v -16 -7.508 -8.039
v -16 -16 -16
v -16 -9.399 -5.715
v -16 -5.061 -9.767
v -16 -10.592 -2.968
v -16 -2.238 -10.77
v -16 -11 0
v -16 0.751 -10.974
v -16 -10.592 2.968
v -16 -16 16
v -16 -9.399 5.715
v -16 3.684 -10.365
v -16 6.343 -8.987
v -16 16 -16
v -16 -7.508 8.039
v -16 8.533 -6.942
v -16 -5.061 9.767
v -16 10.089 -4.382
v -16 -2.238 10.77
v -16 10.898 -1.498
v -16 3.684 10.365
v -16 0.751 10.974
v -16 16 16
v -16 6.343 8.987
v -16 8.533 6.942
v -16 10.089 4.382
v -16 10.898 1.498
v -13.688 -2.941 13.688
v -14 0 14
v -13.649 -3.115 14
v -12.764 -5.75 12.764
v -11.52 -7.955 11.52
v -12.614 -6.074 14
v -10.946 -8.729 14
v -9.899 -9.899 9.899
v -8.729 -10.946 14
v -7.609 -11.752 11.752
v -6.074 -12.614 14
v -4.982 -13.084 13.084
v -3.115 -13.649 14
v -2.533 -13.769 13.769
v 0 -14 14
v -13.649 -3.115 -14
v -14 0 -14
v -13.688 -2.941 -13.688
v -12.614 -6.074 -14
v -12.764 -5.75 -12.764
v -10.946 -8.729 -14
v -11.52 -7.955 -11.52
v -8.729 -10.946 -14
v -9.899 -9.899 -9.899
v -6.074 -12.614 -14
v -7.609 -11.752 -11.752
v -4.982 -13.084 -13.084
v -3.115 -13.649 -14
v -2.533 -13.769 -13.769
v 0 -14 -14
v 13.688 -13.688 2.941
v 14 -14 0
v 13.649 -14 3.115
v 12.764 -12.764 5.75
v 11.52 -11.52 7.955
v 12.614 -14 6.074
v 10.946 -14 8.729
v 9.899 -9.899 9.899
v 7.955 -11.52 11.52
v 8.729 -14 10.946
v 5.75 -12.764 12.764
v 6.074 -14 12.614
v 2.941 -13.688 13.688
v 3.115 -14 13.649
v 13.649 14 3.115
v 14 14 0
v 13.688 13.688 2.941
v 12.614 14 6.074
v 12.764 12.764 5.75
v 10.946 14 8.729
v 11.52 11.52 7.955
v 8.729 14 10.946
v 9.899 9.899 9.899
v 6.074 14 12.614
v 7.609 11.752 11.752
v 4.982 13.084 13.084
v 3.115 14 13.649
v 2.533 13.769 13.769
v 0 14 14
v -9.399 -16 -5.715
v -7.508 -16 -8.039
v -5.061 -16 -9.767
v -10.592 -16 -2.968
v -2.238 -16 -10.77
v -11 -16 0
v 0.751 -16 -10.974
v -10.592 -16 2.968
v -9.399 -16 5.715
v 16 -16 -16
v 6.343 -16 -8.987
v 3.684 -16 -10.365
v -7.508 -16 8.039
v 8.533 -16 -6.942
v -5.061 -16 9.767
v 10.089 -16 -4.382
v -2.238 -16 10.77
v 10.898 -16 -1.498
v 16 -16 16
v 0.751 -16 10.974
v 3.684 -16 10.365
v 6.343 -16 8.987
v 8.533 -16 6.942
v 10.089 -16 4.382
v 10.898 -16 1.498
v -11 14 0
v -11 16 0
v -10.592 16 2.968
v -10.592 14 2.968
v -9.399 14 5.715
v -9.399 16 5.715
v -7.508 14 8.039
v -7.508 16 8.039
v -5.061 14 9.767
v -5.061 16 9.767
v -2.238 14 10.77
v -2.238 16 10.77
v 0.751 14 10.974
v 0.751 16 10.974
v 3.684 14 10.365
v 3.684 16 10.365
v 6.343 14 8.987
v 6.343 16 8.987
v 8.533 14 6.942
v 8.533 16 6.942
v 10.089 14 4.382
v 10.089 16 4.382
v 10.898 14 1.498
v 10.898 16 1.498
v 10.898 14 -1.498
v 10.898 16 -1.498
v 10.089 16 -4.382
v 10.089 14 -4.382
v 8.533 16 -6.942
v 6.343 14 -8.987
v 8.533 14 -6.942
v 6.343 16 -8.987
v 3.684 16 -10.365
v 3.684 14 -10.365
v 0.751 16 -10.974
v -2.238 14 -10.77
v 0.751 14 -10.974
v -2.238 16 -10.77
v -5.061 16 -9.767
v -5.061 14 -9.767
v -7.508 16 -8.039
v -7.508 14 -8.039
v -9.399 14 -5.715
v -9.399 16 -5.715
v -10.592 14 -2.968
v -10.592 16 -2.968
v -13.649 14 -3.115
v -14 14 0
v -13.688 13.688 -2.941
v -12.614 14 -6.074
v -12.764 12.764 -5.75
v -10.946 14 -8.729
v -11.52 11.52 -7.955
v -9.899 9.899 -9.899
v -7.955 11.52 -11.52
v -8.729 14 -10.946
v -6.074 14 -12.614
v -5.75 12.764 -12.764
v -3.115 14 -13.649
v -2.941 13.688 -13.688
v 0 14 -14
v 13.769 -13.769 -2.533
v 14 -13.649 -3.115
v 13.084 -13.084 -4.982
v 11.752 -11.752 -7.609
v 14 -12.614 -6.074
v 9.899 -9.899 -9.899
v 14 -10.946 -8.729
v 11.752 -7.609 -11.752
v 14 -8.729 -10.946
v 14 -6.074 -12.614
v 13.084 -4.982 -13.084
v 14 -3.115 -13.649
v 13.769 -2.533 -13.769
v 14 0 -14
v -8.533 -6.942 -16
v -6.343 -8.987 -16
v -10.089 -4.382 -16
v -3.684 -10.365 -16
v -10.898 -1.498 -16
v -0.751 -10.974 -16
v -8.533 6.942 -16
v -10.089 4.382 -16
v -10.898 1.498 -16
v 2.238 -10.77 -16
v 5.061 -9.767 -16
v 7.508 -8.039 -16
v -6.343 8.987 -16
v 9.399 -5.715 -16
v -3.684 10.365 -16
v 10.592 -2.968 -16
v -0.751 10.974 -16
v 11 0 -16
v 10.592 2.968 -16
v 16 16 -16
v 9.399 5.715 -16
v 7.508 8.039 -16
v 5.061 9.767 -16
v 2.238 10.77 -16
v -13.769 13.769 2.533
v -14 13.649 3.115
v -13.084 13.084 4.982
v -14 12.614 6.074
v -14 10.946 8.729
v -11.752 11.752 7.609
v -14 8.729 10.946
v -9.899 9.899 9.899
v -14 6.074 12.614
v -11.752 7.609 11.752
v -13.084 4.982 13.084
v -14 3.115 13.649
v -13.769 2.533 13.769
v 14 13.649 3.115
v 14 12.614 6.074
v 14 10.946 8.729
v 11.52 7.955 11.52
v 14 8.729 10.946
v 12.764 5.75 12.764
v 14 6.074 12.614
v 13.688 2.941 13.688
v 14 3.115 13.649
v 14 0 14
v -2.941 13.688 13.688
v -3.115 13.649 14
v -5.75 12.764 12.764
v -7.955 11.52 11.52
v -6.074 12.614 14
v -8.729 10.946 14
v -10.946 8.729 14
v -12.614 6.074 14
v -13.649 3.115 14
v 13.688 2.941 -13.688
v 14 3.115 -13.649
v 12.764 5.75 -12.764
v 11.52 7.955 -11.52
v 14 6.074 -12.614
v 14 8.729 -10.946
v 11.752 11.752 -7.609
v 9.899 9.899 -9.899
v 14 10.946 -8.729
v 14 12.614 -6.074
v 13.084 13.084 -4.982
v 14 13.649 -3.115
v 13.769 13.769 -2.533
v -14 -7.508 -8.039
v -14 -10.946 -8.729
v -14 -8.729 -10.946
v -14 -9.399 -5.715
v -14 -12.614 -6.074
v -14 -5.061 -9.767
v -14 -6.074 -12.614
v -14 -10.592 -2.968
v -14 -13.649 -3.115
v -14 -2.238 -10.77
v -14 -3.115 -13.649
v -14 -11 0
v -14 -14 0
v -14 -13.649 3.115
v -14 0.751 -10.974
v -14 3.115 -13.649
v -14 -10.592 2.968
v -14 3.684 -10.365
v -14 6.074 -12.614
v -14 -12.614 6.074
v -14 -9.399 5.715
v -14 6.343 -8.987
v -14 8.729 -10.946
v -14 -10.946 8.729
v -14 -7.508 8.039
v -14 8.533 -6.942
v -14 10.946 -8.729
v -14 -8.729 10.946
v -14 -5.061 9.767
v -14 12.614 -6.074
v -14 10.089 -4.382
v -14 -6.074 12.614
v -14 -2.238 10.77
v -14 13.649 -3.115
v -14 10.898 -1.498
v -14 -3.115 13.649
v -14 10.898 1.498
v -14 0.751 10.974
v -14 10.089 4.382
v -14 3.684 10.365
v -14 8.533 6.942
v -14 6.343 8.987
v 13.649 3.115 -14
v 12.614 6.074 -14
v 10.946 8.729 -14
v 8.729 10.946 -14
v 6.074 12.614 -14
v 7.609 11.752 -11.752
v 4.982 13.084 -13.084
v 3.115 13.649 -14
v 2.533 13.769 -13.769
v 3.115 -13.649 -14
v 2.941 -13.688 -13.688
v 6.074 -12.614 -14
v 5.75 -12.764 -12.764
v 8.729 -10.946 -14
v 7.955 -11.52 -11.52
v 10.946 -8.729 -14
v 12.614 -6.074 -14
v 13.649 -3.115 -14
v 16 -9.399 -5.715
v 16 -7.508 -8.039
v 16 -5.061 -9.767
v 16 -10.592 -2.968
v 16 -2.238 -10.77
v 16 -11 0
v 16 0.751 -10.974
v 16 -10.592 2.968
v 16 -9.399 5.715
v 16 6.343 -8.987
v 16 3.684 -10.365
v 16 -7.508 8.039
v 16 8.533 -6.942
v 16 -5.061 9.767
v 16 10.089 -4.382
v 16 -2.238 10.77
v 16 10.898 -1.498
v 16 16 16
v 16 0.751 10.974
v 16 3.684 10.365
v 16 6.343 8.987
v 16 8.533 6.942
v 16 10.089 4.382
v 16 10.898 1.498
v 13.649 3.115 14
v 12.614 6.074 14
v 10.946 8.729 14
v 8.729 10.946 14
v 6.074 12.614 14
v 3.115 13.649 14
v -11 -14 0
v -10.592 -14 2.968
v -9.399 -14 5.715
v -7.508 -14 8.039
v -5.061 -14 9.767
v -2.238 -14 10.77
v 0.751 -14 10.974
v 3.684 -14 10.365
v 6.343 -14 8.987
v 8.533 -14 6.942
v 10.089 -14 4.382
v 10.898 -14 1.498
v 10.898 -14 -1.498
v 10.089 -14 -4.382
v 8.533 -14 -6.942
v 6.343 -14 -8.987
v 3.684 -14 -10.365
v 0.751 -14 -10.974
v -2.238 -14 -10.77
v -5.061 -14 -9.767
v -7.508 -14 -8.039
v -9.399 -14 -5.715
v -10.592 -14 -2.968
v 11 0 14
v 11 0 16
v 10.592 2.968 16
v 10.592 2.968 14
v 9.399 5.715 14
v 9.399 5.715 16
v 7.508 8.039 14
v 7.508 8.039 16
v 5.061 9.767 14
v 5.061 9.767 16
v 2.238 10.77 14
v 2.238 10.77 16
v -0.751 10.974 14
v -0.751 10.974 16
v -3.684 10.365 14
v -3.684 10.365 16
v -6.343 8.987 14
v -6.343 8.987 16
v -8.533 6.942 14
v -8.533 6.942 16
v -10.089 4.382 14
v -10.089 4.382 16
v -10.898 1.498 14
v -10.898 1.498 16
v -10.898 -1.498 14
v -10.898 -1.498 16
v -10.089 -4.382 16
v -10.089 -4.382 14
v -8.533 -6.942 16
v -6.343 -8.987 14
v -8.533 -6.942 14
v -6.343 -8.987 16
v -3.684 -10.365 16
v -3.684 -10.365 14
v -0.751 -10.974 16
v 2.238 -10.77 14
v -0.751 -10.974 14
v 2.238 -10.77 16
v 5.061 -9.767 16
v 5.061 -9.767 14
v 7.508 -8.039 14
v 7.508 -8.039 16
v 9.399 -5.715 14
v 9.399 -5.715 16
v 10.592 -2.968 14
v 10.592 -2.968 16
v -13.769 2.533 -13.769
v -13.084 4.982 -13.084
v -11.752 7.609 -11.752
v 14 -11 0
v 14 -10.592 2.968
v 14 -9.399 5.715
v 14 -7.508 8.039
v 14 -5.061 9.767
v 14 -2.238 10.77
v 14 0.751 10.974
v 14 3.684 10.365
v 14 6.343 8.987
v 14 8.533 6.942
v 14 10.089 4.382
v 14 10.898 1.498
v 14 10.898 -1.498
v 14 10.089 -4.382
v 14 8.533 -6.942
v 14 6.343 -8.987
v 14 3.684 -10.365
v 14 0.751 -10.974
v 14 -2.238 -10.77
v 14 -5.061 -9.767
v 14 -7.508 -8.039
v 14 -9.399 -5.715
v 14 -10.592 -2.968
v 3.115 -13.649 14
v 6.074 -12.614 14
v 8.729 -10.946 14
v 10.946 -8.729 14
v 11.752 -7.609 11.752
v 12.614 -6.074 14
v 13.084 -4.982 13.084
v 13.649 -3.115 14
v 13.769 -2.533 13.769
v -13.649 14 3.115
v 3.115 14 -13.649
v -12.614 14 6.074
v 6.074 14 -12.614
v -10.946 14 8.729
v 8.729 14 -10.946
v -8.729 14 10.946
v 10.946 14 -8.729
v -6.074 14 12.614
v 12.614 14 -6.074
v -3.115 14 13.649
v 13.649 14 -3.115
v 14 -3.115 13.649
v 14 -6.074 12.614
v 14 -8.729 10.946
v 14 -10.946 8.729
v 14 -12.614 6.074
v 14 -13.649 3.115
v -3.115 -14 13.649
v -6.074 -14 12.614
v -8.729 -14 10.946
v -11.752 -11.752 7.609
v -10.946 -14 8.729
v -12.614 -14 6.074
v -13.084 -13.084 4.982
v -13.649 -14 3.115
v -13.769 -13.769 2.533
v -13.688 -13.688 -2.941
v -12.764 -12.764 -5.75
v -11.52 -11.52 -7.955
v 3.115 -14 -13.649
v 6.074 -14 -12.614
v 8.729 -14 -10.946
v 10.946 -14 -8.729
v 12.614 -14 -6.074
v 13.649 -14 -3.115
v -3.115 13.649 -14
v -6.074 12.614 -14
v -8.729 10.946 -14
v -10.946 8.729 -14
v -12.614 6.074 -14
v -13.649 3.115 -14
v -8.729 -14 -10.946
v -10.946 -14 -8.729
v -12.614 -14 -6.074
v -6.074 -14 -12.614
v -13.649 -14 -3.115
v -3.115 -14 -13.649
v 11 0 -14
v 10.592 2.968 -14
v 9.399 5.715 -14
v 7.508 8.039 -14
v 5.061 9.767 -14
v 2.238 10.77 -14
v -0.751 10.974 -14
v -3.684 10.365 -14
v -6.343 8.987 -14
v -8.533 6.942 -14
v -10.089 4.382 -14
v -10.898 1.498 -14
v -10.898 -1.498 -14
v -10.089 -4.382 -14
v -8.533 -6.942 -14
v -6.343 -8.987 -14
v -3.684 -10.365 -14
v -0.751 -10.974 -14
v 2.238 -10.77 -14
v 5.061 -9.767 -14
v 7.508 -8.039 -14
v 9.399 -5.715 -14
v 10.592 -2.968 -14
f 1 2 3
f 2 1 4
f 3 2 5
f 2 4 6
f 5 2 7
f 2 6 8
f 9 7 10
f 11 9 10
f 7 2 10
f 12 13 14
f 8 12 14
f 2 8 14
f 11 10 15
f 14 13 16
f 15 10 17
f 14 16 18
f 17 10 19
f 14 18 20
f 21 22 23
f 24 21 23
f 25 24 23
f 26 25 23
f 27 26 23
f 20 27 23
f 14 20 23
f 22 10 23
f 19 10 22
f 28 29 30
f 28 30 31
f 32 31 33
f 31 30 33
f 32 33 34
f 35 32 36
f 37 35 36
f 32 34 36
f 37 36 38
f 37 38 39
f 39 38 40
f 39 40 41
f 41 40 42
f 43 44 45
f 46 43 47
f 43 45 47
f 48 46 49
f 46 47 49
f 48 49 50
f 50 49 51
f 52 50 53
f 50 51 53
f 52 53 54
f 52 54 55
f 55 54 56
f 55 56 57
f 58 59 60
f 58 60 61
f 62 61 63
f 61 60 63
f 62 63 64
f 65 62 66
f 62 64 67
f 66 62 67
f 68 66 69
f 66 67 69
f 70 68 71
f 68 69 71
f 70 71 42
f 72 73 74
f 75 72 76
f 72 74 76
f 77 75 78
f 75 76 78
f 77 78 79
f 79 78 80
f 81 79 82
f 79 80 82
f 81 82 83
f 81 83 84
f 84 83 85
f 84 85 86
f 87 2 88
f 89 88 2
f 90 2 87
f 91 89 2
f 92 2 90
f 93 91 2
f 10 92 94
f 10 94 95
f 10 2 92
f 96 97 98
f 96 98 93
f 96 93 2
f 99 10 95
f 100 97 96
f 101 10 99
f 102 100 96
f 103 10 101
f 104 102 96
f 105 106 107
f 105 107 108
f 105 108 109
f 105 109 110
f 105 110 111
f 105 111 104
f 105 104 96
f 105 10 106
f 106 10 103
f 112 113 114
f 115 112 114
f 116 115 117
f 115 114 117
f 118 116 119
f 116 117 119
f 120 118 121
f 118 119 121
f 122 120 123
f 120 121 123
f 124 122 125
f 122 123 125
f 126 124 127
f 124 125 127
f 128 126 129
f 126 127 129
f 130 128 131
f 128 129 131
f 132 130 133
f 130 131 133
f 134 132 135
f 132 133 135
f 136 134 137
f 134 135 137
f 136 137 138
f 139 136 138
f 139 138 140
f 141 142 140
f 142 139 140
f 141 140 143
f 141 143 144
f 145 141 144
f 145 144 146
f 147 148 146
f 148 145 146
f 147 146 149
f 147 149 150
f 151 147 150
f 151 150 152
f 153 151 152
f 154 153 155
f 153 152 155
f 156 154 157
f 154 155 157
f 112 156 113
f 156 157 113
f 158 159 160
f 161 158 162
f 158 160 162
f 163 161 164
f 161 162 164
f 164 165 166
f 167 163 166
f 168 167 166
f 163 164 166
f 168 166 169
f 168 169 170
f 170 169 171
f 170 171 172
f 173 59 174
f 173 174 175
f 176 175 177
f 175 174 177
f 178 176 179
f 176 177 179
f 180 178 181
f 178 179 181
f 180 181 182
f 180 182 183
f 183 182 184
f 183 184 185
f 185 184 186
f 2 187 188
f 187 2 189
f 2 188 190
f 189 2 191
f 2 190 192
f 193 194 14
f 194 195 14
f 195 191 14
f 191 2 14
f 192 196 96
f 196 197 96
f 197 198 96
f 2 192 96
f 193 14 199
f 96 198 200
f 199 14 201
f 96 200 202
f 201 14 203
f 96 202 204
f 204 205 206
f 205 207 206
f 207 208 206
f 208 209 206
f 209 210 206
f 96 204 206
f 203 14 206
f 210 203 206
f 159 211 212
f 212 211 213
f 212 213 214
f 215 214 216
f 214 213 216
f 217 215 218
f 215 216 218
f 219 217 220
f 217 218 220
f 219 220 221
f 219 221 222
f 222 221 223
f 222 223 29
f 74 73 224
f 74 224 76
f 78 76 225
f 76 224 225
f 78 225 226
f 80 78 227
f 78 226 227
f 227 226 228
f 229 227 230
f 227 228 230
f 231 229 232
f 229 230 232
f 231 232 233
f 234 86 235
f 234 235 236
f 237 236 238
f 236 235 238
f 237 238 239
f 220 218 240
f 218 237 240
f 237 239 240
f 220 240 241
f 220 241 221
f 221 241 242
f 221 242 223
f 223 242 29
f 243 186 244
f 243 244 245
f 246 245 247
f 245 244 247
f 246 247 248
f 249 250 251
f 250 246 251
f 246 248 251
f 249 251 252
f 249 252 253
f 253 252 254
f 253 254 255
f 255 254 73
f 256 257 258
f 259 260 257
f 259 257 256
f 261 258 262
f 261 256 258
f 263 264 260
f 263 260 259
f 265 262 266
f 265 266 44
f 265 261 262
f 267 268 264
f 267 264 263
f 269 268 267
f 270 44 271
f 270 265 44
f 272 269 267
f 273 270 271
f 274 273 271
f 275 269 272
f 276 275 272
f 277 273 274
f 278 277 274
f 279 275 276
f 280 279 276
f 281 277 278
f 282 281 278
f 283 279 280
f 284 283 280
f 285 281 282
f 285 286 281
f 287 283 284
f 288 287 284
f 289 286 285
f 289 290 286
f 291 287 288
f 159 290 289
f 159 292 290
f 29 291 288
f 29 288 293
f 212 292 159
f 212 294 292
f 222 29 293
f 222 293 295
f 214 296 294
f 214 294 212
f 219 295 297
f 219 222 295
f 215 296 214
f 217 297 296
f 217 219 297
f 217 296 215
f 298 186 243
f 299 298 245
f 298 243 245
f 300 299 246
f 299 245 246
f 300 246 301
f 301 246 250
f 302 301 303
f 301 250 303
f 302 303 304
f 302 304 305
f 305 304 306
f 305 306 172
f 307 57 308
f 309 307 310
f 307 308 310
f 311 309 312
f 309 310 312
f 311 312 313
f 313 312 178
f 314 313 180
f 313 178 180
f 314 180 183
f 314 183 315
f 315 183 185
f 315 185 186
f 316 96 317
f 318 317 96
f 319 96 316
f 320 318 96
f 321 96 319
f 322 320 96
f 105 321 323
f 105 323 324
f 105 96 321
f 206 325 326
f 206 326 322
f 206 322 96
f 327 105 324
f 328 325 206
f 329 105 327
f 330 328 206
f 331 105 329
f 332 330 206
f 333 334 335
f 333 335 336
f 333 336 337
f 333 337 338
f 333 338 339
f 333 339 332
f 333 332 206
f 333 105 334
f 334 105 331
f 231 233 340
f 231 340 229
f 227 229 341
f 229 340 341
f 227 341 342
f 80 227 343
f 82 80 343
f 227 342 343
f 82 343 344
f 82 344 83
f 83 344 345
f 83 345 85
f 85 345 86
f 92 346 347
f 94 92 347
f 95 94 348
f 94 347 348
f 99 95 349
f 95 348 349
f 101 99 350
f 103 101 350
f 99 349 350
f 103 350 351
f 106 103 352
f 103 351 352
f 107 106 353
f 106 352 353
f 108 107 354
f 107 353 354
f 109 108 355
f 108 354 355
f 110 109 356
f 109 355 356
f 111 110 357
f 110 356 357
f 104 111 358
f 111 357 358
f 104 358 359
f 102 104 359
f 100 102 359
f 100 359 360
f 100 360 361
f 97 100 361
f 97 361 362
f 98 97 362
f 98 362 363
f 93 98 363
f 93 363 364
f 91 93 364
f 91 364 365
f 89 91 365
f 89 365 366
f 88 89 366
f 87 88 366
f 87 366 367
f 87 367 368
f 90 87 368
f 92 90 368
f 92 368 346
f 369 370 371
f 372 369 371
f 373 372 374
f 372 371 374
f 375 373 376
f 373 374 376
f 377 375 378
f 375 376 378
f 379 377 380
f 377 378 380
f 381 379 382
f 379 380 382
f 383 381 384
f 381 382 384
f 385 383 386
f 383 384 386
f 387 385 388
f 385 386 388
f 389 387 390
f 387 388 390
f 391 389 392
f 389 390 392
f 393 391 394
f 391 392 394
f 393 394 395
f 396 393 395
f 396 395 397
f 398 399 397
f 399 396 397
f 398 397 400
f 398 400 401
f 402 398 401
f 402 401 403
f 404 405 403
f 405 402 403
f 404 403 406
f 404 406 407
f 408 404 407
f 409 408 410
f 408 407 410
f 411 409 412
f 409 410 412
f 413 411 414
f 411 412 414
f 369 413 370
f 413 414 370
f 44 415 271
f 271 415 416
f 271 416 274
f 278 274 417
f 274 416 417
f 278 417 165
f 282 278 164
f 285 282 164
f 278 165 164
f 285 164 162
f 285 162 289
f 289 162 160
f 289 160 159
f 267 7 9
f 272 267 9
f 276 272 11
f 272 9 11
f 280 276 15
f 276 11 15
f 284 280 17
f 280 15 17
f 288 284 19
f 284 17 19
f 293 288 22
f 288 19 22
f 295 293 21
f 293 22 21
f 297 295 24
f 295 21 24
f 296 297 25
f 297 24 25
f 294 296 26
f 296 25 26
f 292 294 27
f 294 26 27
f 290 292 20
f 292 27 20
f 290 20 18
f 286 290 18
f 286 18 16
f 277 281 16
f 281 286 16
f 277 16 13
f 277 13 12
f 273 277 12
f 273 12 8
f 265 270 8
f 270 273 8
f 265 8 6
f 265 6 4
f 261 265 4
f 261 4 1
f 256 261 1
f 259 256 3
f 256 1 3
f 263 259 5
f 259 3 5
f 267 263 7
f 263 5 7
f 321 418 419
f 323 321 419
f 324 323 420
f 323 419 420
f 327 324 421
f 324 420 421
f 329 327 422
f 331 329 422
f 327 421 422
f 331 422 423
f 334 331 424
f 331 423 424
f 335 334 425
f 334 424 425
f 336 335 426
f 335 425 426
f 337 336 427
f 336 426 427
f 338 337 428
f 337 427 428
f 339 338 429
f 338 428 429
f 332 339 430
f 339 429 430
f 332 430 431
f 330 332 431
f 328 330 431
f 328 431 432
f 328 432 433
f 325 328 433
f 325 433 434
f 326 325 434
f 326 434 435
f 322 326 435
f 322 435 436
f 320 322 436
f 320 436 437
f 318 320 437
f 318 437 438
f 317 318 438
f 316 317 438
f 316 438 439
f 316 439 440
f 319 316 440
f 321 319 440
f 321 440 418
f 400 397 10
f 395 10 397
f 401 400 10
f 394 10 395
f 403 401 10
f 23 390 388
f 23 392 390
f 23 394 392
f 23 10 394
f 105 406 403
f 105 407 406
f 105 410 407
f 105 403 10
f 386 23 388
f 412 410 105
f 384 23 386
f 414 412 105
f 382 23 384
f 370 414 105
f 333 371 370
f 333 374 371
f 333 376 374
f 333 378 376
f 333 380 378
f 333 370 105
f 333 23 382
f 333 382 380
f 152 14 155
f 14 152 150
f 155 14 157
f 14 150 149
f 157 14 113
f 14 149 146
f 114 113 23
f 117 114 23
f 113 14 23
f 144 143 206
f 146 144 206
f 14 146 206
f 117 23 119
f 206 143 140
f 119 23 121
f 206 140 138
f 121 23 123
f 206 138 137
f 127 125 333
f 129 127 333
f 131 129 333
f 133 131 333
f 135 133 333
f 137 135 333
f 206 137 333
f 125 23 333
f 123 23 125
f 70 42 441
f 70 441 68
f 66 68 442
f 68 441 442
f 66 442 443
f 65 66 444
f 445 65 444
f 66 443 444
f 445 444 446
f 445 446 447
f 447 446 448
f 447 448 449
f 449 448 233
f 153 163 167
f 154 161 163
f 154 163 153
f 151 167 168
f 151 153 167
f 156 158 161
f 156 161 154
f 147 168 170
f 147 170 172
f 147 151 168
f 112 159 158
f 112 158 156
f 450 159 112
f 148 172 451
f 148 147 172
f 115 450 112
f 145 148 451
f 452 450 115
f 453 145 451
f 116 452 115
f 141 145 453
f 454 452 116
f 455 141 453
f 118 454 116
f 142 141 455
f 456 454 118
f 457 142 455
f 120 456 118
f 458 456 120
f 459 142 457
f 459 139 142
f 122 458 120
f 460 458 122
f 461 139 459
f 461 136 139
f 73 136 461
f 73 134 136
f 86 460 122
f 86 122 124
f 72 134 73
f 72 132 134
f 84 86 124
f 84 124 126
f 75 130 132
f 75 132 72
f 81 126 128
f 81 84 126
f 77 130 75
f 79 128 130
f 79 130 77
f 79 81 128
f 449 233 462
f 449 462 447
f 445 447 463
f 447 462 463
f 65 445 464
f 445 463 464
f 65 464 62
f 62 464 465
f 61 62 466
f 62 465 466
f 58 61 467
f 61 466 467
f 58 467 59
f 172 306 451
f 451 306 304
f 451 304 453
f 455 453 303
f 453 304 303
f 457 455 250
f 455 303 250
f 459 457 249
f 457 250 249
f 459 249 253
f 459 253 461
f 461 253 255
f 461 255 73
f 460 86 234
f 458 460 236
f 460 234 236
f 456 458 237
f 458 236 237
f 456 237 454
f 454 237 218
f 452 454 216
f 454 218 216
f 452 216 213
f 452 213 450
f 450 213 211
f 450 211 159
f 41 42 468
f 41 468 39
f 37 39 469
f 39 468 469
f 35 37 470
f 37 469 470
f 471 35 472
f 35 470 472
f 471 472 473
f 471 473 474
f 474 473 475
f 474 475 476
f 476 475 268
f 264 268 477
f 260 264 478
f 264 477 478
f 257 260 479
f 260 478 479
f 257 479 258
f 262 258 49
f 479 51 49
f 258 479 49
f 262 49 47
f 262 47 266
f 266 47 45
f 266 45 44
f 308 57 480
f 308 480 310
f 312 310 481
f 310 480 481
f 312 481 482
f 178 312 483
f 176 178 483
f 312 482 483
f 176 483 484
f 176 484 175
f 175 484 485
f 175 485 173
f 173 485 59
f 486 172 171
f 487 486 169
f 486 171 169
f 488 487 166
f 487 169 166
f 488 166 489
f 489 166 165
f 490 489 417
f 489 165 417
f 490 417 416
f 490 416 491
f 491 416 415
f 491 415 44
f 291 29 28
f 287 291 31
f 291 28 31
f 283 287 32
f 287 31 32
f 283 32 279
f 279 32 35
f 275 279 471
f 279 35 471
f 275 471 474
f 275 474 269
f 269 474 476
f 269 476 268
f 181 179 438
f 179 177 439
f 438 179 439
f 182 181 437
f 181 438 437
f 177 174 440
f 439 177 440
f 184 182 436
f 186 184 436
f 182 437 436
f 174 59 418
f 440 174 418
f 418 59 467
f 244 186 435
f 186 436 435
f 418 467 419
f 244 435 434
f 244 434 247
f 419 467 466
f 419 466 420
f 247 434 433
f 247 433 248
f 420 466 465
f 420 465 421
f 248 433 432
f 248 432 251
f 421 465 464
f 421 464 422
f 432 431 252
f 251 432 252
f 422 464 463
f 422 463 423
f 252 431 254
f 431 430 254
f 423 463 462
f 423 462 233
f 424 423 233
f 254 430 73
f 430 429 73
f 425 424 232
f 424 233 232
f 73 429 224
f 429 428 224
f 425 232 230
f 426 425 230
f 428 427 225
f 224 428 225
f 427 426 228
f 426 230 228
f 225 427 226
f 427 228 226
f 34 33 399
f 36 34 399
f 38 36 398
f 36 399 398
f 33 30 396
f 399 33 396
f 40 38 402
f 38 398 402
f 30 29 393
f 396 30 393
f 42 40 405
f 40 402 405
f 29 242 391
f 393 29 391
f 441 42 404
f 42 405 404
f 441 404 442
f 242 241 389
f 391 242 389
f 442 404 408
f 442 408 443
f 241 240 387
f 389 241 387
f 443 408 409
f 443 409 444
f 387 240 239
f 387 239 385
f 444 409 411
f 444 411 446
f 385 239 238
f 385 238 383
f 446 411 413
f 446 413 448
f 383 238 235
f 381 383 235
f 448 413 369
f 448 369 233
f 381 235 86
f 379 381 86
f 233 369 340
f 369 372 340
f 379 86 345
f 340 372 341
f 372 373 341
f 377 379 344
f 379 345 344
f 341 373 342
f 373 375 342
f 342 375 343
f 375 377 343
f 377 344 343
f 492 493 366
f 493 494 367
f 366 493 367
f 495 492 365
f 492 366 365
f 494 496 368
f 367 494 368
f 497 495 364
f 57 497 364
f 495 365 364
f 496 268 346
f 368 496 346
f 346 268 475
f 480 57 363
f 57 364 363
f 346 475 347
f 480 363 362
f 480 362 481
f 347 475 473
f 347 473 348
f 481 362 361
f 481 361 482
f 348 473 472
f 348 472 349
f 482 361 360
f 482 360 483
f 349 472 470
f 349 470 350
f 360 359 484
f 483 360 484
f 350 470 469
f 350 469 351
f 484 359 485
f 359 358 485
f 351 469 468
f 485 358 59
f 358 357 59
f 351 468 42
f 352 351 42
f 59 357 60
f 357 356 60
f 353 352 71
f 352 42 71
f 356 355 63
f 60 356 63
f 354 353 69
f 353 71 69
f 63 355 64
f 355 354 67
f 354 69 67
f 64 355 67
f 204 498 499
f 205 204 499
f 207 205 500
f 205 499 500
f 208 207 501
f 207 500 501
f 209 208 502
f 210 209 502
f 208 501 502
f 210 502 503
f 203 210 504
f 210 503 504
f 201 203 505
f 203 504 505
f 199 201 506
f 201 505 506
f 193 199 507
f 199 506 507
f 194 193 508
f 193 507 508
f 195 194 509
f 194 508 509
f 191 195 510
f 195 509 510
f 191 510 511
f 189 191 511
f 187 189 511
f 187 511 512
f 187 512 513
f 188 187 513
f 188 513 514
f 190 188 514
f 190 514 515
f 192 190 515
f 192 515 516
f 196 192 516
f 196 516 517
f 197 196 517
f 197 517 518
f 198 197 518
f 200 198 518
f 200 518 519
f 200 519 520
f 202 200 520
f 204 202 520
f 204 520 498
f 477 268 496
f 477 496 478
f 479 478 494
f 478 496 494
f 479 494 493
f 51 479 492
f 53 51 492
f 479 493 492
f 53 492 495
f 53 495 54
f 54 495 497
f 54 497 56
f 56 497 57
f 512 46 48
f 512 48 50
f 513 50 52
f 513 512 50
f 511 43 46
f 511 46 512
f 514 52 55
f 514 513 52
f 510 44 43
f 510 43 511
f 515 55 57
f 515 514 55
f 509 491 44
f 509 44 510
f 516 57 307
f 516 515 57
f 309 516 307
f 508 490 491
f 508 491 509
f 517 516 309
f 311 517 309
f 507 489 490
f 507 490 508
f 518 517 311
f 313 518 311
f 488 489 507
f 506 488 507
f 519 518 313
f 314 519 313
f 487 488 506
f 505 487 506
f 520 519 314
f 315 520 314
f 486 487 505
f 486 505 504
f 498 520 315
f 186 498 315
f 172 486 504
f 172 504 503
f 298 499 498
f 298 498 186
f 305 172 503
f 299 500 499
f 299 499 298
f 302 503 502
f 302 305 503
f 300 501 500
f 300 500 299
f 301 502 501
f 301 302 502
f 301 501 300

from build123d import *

# Parameters (mm, degrees)
F0_W      = 32
F0_H      = 32
F1_DEPTH  = 16
F2_R      = 11
F3_DEPTH  = 32.001
F4_R      = 11
F5_DEPTH  = 32.001
F6_R      = 11
F7_DEPTH  = 32.001
F8_R      = 14
F9_DEPTH  = 14
F10_R     = 14
F11_DEPTH = 14
F12_R     = 14
F13_DEPTH = 14


with BuildPart() as f1:
    # F0 (on Top) → F1 (new body, symmetric)
    with BuildSketch(Plane.XY):
        Rectangle(F0_W, F0_H)
    extrude(amount=F1_DEPTH, both=True)

    # F2 (on face) → F3 (cut, through all)
    with BuildSketch(Plane(origin=(-16, 0, 0), x_dir=(0, -1, 0), z_dir=(-1, 0, 0))):
        Circle(F2_R)
    extrude(amount=-F3_DEPTH, mode=Mode.SUBTRACT)

    # F4 (on face) → F5 (cut, through all)
    with BuildSketch(Plane.XY.offset(16)):
        Circle(F4_R)
    extrude(amount=-F5_DEPTH, mode=Mode.SUBTRACT)

    # F6 (on face) → F7 (cut, through all)
    with BuildSketch(Plane(origin=(0, 16, 0), x_dir=(-1, 0, 0), z_dir=(0, 1, 0))):
        Circle(F6_R)
    extrude(amount=-F7_DEPTH, mode=Mode.SUBTRACT)

    # F8 (on Top) → F9 (cut, symmetric)
    with BuildSketch(Plane.XY):
        Circle(F8_R)
    extrude(amount=F9_DEPTH, both=True, mode=Mode.SUBTRACT)

    # F10 (on Front) → F11 (cut, symmetric)
    with BuildSketch(Plane.XZ):
        Circle(F10_R)
    extrude(amount=F11_DEPTH, both=True, mode=Mode.SUBTRACT)

    # F12 (on Right) → F13 (cut, symmetric)
    with BuildSketch(Plane.YZ):
        Circle(F12_R)
    extrude(amount=F13_DEPTH, both=True, mode=Mode.SUBTRACT)


solid = f1.part
